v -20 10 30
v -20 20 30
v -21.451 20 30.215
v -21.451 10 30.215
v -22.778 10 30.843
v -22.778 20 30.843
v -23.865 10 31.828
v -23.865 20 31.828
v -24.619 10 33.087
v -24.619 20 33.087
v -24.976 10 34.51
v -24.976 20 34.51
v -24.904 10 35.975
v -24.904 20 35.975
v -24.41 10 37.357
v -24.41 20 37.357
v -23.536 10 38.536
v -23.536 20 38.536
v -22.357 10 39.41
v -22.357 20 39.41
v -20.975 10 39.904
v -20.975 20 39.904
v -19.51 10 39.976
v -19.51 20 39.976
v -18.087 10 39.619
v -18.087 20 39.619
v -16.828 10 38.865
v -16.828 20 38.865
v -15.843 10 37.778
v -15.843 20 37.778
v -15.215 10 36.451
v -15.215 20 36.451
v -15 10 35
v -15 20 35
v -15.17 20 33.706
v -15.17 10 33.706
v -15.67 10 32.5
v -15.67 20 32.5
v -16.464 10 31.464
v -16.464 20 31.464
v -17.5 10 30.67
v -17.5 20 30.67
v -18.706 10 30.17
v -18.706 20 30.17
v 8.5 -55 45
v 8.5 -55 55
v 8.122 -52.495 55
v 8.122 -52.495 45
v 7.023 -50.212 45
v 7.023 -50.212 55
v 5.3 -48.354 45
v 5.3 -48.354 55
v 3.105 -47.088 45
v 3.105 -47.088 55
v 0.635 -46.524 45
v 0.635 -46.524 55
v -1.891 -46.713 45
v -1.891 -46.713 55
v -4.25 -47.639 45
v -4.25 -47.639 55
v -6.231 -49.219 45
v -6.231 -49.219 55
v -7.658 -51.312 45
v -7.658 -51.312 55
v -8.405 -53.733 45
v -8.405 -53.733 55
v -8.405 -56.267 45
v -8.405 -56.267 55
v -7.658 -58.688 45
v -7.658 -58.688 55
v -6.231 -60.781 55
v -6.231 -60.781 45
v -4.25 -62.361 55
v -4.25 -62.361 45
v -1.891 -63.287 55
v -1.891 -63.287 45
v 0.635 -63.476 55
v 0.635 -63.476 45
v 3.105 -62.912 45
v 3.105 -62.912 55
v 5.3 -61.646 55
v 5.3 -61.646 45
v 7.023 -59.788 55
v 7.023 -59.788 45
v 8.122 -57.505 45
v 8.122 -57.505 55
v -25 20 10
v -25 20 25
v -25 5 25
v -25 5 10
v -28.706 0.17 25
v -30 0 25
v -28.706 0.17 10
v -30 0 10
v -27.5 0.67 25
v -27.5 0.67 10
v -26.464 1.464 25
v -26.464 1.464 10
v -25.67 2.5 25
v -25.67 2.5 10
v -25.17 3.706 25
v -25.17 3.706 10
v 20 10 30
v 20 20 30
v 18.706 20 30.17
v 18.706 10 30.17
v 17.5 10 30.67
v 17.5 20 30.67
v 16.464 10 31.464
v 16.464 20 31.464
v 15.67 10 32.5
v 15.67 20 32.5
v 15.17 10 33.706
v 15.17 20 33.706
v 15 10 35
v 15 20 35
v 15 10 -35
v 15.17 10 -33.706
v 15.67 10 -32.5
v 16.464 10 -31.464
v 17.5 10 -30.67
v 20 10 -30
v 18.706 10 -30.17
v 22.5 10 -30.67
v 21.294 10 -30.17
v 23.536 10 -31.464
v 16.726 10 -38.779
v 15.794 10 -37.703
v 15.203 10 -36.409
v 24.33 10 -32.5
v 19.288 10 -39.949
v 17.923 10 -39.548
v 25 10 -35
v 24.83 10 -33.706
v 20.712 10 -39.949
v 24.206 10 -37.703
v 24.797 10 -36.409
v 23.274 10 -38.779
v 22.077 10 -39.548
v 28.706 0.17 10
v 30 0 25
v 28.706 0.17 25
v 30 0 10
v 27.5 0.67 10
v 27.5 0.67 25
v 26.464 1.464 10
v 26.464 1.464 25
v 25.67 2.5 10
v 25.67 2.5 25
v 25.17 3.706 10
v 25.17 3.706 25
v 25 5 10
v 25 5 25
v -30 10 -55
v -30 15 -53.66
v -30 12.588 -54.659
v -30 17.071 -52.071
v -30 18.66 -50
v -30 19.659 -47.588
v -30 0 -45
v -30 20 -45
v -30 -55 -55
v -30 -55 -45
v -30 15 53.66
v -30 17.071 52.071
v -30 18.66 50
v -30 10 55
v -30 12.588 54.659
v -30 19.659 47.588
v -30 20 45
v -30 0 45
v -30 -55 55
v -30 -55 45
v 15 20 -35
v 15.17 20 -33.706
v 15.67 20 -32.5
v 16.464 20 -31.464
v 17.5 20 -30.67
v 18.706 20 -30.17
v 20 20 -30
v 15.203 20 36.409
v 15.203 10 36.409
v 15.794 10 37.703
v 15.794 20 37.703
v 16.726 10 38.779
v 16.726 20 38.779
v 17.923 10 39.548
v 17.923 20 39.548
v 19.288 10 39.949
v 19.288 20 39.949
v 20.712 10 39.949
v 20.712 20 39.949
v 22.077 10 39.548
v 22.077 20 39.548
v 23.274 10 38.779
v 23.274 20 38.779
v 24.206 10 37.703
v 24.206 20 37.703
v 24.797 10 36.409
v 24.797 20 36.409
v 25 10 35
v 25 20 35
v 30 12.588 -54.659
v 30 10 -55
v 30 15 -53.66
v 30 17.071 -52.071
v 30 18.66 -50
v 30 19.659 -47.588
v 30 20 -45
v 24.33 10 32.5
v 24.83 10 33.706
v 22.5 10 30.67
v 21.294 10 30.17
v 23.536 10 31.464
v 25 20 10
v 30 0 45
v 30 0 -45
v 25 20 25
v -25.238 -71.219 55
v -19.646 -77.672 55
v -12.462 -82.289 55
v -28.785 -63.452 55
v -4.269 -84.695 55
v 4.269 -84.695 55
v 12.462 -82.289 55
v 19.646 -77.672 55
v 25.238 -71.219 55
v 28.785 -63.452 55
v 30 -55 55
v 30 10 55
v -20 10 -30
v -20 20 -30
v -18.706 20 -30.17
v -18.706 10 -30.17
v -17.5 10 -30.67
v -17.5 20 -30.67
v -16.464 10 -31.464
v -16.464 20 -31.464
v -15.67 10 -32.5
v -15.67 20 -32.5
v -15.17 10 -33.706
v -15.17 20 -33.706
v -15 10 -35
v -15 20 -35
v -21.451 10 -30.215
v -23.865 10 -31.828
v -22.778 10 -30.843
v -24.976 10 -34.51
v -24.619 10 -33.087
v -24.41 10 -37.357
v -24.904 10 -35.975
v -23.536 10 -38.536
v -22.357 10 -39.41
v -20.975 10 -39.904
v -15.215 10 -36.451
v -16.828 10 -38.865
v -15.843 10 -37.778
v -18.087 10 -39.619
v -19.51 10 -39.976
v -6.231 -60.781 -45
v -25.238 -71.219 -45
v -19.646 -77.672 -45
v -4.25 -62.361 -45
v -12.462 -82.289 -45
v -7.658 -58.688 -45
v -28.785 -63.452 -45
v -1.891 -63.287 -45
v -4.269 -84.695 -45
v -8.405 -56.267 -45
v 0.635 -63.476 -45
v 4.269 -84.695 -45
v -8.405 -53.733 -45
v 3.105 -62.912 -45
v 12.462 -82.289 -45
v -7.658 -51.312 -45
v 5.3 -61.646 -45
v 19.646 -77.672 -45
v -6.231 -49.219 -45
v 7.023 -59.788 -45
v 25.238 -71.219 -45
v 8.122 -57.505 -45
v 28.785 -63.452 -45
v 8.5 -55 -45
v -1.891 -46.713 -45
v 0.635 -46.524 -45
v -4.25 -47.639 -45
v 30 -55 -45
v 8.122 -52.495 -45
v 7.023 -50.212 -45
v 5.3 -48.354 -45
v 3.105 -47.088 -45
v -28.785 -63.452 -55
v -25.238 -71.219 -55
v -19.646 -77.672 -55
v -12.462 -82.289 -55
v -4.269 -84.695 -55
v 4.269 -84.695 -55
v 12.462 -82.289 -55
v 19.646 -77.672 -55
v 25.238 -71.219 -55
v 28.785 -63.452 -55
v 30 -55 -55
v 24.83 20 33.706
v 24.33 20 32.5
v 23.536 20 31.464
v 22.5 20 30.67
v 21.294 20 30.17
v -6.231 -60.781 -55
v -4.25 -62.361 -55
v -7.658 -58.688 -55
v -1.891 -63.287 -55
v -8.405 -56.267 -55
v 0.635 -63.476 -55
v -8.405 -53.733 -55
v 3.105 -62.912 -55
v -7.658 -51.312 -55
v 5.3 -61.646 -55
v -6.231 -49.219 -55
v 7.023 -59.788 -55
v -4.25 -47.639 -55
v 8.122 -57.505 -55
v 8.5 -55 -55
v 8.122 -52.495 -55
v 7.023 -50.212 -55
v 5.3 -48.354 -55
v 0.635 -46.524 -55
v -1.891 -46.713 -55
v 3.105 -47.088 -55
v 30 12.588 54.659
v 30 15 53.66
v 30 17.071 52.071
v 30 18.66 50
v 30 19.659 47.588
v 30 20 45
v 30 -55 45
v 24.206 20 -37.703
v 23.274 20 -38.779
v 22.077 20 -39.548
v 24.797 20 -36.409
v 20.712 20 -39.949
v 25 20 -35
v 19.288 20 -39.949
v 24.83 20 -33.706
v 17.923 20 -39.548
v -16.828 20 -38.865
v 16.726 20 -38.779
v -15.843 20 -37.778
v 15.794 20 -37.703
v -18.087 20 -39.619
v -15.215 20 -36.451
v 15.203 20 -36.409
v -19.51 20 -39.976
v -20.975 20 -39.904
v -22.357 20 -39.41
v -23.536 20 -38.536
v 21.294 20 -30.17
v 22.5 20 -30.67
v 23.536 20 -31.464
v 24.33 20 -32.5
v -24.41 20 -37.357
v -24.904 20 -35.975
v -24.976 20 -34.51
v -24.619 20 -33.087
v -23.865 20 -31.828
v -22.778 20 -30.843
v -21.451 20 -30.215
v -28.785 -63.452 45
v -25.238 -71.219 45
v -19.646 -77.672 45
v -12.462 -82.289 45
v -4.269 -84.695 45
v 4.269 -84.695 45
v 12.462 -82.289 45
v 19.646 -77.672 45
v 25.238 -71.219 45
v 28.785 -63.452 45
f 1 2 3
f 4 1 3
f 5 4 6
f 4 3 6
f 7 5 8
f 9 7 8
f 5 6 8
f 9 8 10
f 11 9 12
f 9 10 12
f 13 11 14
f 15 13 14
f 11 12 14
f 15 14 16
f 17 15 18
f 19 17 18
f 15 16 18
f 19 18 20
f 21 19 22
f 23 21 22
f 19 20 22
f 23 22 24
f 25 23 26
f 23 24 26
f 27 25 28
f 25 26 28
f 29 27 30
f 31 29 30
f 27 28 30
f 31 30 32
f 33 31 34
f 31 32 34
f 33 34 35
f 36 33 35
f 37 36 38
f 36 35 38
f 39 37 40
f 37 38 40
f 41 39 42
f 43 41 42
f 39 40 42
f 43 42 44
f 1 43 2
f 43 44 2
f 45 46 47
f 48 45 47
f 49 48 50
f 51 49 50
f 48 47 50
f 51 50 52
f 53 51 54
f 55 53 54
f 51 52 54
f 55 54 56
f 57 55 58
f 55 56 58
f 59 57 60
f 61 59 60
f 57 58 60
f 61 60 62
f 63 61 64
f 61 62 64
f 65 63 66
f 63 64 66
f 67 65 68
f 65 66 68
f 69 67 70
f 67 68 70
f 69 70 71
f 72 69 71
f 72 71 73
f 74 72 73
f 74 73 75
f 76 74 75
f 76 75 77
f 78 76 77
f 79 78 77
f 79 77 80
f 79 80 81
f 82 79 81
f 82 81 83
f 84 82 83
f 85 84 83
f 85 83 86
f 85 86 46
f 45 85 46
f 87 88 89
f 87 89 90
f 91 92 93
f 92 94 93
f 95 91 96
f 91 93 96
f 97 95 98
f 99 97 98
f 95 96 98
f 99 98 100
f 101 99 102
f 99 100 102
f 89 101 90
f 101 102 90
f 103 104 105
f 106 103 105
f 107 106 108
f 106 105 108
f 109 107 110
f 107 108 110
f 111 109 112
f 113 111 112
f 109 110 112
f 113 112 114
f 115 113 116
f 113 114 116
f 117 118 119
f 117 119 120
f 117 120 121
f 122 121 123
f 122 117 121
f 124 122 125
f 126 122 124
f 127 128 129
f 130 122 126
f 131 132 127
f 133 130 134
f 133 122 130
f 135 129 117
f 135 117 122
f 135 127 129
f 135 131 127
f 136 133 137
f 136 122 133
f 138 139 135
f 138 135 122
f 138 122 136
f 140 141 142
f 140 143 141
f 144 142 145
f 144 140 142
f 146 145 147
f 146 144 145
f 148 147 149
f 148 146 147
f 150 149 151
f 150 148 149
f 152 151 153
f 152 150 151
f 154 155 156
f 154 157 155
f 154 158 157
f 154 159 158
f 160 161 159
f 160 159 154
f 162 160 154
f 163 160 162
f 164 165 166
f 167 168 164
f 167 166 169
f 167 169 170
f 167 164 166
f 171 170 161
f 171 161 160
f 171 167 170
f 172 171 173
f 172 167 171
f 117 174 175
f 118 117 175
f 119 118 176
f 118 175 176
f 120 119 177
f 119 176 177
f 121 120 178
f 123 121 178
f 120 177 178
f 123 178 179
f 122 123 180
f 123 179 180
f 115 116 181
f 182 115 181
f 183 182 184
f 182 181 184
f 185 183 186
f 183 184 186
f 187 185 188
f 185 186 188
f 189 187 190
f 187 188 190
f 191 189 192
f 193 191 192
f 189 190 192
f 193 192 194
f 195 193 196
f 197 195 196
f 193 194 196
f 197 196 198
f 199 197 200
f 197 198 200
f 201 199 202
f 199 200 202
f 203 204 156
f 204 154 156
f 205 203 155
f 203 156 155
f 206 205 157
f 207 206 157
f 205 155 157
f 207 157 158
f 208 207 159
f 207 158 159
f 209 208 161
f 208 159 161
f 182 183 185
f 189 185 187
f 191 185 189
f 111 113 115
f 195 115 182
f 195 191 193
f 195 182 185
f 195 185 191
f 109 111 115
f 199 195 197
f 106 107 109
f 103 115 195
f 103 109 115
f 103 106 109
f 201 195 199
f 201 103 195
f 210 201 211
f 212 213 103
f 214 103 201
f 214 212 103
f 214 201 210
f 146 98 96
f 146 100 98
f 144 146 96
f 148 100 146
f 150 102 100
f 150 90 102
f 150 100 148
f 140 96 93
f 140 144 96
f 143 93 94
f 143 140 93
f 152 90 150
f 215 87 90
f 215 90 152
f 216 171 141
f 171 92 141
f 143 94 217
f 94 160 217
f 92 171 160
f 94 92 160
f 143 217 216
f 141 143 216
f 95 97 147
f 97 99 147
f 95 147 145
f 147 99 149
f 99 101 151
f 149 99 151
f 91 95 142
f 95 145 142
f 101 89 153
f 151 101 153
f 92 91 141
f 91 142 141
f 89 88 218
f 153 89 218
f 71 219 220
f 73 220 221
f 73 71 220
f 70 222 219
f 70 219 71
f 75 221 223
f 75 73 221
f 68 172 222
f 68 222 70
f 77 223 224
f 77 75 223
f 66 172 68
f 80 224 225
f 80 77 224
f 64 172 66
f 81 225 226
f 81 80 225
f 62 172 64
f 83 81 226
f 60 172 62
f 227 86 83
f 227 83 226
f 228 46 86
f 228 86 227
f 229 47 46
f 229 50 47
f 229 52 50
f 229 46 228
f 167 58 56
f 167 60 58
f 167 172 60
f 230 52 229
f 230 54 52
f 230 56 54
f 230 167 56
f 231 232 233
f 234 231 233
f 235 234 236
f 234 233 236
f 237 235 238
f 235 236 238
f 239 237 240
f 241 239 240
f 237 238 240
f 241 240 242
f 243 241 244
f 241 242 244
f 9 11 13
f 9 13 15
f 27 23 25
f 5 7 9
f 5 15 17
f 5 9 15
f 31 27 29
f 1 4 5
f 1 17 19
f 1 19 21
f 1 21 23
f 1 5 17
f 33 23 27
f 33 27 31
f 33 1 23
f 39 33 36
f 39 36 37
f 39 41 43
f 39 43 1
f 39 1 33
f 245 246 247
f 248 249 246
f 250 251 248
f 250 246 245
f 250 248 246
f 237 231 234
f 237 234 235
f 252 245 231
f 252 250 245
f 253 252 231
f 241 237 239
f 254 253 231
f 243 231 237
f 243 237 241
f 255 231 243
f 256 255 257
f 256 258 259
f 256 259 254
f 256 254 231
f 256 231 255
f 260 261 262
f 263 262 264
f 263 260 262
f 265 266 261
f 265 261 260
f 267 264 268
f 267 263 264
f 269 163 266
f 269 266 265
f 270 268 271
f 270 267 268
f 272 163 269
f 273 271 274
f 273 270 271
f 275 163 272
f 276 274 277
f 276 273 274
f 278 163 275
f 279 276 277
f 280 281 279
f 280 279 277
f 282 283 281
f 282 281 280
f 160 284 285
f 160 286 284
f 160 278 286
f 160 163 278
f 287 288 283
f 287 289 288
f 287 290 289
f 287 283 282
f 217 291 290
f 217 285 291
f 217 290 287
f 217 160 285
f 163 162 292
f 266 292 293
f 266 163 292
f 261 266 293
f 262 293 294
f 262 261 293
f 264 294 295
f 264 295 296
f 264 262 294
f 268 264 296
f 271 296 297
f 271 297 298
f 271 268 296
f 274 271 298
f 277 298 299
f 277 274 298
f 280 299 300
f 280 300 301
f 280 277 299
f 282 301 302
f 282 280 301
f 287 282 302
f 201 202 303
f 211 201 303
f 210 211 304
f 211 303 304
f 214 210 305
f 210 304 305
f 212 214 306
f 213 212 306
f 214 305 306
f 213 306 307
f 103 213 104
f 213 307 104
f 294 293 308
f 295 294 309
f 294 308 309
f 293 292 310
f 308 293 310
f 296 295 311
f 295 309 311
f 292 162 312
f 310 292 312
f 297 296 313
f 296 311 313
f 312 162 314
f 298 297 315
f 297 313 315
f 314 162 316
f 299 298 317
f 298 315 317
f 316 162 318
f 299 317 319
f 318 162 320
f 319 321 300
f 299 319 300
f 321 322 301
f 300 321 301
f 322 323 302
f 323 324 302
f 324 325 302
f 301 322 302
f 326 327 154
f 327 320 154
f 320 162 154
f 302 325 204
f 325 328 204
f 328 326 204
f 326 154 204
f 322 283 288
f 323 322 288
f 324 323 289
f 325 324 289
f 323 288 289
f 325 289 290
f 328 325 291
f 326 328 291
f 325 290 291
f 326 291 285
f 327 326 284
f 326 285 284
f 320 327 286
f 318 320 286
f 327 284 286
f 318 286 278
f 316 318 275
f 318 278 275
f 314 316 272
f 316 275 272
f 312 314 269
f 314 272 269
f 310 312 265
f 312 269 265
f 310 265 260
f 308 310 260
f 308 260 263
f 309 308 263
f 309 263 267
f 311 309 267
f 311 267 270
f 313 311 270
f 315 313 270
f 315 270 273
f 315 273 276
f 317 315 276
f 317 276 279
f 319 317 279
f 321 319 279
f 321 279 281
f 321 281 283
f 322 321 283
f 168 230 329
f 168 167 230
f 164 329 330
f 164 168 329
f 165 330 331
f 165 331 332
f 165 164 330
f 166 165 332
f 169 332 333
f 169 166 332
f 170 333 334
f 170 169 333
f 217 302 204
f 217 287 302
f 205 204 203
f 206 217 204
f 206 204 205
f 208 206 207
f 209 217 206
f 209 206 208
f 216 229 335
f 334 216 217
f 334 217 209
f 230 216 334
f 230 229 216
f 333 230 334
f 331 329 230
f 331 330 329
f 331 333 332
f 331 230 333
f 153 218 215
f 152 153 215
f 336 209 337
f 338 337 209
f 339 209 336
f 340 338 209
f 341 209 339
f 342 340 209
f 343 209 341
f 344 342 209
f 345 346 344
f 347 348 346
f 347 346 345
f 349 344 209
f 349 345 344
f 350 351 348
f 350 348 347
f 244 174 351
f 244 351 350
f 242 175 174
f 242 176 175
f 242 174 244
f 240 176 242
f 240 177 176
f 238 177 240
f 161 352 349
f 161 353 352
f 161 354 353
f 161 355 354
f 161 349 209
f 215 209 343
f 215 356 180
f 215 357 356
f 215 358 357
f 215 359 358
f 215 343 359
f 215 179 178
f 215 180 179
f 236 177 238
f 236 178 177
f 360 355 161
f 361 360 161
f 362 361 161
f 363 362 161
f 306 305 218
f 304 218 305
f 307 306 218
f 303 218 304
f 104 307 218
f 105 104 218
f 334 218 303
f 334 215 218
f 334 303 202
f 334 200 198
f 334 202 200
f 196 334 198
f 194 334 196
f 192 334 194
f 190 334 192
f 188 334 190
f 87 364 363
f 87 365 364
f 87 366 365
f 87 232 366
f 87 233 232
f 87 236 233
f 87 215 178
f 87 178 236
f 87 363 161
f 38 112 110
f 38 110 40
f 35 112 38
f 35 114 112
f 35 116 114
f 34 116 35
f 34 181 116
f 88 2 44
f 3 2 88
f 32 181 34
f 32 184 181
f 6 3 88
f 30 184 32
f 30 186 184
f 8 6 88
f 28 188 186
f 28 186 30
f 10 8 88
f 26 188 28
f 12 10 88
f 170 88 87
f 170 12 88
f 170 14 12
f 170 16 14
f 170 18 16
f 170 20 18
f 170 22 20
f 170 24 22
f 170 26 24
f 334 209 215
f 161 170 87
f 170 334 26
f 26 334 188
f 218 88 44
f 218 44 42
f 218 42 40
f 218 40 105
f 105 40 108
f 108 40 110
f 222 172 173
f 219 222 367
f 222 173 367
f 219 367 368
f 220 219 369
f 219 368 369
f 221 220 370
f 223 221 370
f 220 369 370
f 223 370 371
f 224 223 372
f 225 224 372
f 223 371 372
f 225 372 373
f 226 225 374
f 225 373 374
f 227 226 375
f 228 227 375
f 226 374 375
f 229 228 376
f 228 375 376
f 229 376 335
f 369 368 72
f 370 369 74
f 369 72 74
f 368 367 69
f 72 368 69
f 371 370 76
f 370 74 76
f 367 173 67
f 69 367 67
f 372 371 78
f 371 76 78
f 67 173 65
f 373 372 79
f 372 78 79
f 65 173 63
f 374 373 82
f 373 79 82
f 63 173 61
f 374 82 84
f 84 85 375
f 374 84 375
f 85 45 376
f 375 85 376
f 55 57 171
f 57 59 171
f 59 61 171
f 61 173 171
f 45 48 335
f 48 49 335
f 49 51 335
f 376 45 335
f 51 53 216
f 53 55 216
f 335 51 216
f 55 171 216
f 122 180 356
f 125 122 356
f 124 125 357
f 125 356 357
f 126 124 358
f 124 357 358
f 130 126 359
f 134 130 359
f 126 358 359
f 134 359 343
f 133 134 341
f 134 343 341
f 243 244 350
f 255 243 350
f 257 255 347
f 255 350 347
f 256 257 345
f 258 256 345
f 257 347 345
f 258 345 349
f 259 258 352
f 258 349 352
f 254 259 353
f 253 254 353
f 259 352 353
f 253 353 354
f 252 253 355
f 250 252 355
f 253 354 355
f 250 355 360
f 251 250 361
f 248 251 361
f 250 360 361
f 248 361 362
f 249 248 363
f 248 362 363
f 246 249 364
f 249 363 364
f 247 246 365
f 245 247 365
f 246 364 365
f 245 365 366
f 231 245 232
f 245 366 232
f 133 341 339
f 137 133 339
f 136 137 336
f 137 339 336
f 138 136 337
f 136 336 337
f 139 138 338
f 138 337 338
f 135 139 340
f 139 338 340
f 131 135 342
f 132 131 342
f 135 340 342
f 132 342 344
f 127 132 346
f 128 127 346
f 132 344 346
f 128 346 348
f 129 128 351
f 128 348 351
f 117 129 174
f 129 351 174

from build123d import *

# Parameters (mm, degrees)
SKETCH1_W           = 60
SKETCH1_H           = 90
BOSS_EXTRUDE1_DEPTH = 20
CUT_EXTRUDE1_DEPTH  = 10
BOSS_EXTRUDE2_DEPTH = 10
SKETCH5_R           = 8.5
CUT_EXTRUDE2_DEPTH  = 143.214626533
FILLET1_R           = 10
SKETCH6_W           = 50
SKETCH6_H           = 15
CUT_EXTRUDE3_DEPTH  = 123.270192606
FILLET2_R           = 5


with BuildPart() as part:
    # Sketch1 → Boss-Extrude1 (new body)
    with BuildSketch(Plane(origin=(0, 0, 0), x_dir=(1, 0, 0), z_dir=(0, 1, 0))):
        Rectangle(SKETCH1_W, SKETCH1_H)
    extrude(amount=BOSS_EXTRUDE1_DEPTH)

    # Sketch3 → Cut-Extrude1 (cut)
    with BuildSketch(Plane(origin=(0, 20, 0), x_dir=(1, 0, 0), z_dir=(0, 1, 0))):
        with BuildLine():
            ThreePointArc((-20, 30), (-16.464466094, 31.464466094), (-15, 35))
            Line((-15, 35), (-20, 35))
            Line((-20, 35), (-20, 30))
        make_face()
        with BuildLine():
            Line((-20, 35), (-15, 35))
            ThreePointArc((-15, 35), (-23.535533906, 38.535533906), (-20, 30))
            Line((-20, 30), (-20, 35))
        make_face()
        with BuildLine():
            ThreePointArc((-20, 30), (-16.464466094, 31.464466094), (-15, 35))
            Line((-15, 35), (-20, 35))
            Line((-20, 35), (-20, 30))
        make_face()
        with BuildLine():
            Line((-20, 35), (-15, 35))
            ThreePointArc((-15, 35), (-23.535533906, 38.535533906), (-20, 30))
            Line((-20, 30), (-20, 35))
        make_face()
        with BuildLine():
            ThreePointArc((-20, -30), (-23.535533906, -38.535533906), (-15, -35))
            Line((-15, -35), (-20, -35))
            Line((-20, -35), (-20, -30))
        make_face()
        with BuildLine():
            Line((-20, -35), (-15, -35))
            ThreePointArc((-15, -35), (-16.464466094, -31.464466094), (-20, -30))
            Line((-20, -30), (-20, -35))
        make_face()
        with BuildLine():
            ThreePointArc((-20, -30), (-23.535533906, -38.535533906), (-15, -35))
            Line((-15, -35), (-20, -35))
            Line((-20, -35), (-20, -30))
        make_face()
        with BuildLine():
            Line((-20, -35), (-15, -35))
            ThreePointArc((-15, -35), (-16.464466094, -31.464466094), (-20, -30))
            Line((-20, -30), (-20, -35))
        make_face()
        with BuildLine():
            Line((15, -35), (20, -35))
            Line((20, -35), (20, -30))
            ThreePointArc((20, -30), (16.464466094, -31.464466094), (15, -35))
        make_face()
        with BuildLine():
            Line((20, -30), (20, -35))
            Line((20, -35), (15, -35))
            ThreePointArc((15, -35), (20, -40), (25, -35))
            ThreePointArc((25, -35), (23.535533906, -31.464466094), (20, -30))
        make_face()
        with BuildLine():
            Line((15, -35), (20, -35))
            Line((20, -35), (20, -30))
            ThreePointArc((20, -30), (16.464466094, -31.464466094), (15, -35))
        make_face()
        with BuildLine():
            Line((20, -30), (20, -35))
            Line((20, -35), (15, -35))
            ThreePointArc((15, -35), (20, -40), (25, -35))
            ThreePointArc((25, -35), (23.535533906, -31.464466094), (20, -30))
        make_face()
        with BuildLine():
            ThreePointArc((15, 35), (16.464466094, 31.464466094), (20, 30))
            Line((20, 30), (20, 35))
            Line((20, 35), (15, 35))
        make_face()
        with BuildLine():
            Line((20, 35), (20, 30))
            ThreePointArc((20, 30), (23.535533906, 31.464466094), (25, 35))
            ThreePointArc((25, 35), (20, 40), (15, 35))
            Line((15, 35), (20, 35))
        make_face()
        with BuildLine():
            ThreePointArc((15, 35), (16.464466094, 31.464466094), (20, 30))
            Line((20, 30), (20, 35))
            Line((20, 35), (15, 35))
        make_face()
        with BuildLine():
            Line((20, 35), (20, 30))
            ThreePointArc((20, 30), (23.535533906, 31.464466094), (25, 35))
            ThreePointArc((25, 35), (20, 40), (15, 35))
            Line((15, 35), (20, 35))
        make_face()
    extrude(amount=-CUT_EXTRUDE1_DEPTH, mode=Mode.SUBTRACT)

    # Sketch4 → Boss-Extrude2 (add)
    with BuildSketch(Plane.XY.offset(45)):
        with BuildLine():
            Line((-30, 0), (-30, -55))
            ThreePointArc((-30, -55), (0, -85), (30, -55))
            Line((30, -55), (30, 0))
            Line((30, 0), (30, 20))
            Line((30, 20), (-30, 20))
            Line((-30, 20), (-30, 0))
        make_face()
    boss_extrude2 = extrude(amount=BOSS_EXTRUDE2_DEPTH)

    # Mirror1: Boss-Extrude2 across plane
    add(boss_extrude2.mirror(Plane.XY))

    # Sketch5 → Cut-Extrude2 (cut, through all)
    with BuildSketch(Plane.XY.offset(55)):
        with Locations((0, -55)):
            Circle(SKETCH5_R)
    extrude(amount=-CUT_EXTRUDE2_DEPTH, mode=Mode.SUBTRACT)

    # Fillet1
    fillet1_edges = [part.edges().sort_by_distance(p)[0] for p in [
        (0, 20, 55),
        (0, 20, -55),
    ]]
    fillet(fillet1_edges, radius=FILLET1_R)

    # Sketch6 → Cut-Extrude3 (cut, through all)
    with BuildSketch(Plane(origin=(0, 20, 0), x_dir=(1, 0, 0), z_dir=(0, 1, 0))):
        with Locations((0, -17.5)):
            Rectangle(SKETCH6_W, SKETCH6_H)
    extrude(amount=-CUT_EXTRUDE3_DEPTH, mode=Mode.SUBTRACT)

    # Fillet2
    fillet2_edges = [part.edges().sort_by_distance(p)[0] for p in [
        (-25, 0, 17.5),
        (25, 0, 17.5),
    ]]
    fillet(fillet2_edges, radius=FILLET2_R - 0.0001)  # a hair under: the kernel refuses the full size


solid = part.part
